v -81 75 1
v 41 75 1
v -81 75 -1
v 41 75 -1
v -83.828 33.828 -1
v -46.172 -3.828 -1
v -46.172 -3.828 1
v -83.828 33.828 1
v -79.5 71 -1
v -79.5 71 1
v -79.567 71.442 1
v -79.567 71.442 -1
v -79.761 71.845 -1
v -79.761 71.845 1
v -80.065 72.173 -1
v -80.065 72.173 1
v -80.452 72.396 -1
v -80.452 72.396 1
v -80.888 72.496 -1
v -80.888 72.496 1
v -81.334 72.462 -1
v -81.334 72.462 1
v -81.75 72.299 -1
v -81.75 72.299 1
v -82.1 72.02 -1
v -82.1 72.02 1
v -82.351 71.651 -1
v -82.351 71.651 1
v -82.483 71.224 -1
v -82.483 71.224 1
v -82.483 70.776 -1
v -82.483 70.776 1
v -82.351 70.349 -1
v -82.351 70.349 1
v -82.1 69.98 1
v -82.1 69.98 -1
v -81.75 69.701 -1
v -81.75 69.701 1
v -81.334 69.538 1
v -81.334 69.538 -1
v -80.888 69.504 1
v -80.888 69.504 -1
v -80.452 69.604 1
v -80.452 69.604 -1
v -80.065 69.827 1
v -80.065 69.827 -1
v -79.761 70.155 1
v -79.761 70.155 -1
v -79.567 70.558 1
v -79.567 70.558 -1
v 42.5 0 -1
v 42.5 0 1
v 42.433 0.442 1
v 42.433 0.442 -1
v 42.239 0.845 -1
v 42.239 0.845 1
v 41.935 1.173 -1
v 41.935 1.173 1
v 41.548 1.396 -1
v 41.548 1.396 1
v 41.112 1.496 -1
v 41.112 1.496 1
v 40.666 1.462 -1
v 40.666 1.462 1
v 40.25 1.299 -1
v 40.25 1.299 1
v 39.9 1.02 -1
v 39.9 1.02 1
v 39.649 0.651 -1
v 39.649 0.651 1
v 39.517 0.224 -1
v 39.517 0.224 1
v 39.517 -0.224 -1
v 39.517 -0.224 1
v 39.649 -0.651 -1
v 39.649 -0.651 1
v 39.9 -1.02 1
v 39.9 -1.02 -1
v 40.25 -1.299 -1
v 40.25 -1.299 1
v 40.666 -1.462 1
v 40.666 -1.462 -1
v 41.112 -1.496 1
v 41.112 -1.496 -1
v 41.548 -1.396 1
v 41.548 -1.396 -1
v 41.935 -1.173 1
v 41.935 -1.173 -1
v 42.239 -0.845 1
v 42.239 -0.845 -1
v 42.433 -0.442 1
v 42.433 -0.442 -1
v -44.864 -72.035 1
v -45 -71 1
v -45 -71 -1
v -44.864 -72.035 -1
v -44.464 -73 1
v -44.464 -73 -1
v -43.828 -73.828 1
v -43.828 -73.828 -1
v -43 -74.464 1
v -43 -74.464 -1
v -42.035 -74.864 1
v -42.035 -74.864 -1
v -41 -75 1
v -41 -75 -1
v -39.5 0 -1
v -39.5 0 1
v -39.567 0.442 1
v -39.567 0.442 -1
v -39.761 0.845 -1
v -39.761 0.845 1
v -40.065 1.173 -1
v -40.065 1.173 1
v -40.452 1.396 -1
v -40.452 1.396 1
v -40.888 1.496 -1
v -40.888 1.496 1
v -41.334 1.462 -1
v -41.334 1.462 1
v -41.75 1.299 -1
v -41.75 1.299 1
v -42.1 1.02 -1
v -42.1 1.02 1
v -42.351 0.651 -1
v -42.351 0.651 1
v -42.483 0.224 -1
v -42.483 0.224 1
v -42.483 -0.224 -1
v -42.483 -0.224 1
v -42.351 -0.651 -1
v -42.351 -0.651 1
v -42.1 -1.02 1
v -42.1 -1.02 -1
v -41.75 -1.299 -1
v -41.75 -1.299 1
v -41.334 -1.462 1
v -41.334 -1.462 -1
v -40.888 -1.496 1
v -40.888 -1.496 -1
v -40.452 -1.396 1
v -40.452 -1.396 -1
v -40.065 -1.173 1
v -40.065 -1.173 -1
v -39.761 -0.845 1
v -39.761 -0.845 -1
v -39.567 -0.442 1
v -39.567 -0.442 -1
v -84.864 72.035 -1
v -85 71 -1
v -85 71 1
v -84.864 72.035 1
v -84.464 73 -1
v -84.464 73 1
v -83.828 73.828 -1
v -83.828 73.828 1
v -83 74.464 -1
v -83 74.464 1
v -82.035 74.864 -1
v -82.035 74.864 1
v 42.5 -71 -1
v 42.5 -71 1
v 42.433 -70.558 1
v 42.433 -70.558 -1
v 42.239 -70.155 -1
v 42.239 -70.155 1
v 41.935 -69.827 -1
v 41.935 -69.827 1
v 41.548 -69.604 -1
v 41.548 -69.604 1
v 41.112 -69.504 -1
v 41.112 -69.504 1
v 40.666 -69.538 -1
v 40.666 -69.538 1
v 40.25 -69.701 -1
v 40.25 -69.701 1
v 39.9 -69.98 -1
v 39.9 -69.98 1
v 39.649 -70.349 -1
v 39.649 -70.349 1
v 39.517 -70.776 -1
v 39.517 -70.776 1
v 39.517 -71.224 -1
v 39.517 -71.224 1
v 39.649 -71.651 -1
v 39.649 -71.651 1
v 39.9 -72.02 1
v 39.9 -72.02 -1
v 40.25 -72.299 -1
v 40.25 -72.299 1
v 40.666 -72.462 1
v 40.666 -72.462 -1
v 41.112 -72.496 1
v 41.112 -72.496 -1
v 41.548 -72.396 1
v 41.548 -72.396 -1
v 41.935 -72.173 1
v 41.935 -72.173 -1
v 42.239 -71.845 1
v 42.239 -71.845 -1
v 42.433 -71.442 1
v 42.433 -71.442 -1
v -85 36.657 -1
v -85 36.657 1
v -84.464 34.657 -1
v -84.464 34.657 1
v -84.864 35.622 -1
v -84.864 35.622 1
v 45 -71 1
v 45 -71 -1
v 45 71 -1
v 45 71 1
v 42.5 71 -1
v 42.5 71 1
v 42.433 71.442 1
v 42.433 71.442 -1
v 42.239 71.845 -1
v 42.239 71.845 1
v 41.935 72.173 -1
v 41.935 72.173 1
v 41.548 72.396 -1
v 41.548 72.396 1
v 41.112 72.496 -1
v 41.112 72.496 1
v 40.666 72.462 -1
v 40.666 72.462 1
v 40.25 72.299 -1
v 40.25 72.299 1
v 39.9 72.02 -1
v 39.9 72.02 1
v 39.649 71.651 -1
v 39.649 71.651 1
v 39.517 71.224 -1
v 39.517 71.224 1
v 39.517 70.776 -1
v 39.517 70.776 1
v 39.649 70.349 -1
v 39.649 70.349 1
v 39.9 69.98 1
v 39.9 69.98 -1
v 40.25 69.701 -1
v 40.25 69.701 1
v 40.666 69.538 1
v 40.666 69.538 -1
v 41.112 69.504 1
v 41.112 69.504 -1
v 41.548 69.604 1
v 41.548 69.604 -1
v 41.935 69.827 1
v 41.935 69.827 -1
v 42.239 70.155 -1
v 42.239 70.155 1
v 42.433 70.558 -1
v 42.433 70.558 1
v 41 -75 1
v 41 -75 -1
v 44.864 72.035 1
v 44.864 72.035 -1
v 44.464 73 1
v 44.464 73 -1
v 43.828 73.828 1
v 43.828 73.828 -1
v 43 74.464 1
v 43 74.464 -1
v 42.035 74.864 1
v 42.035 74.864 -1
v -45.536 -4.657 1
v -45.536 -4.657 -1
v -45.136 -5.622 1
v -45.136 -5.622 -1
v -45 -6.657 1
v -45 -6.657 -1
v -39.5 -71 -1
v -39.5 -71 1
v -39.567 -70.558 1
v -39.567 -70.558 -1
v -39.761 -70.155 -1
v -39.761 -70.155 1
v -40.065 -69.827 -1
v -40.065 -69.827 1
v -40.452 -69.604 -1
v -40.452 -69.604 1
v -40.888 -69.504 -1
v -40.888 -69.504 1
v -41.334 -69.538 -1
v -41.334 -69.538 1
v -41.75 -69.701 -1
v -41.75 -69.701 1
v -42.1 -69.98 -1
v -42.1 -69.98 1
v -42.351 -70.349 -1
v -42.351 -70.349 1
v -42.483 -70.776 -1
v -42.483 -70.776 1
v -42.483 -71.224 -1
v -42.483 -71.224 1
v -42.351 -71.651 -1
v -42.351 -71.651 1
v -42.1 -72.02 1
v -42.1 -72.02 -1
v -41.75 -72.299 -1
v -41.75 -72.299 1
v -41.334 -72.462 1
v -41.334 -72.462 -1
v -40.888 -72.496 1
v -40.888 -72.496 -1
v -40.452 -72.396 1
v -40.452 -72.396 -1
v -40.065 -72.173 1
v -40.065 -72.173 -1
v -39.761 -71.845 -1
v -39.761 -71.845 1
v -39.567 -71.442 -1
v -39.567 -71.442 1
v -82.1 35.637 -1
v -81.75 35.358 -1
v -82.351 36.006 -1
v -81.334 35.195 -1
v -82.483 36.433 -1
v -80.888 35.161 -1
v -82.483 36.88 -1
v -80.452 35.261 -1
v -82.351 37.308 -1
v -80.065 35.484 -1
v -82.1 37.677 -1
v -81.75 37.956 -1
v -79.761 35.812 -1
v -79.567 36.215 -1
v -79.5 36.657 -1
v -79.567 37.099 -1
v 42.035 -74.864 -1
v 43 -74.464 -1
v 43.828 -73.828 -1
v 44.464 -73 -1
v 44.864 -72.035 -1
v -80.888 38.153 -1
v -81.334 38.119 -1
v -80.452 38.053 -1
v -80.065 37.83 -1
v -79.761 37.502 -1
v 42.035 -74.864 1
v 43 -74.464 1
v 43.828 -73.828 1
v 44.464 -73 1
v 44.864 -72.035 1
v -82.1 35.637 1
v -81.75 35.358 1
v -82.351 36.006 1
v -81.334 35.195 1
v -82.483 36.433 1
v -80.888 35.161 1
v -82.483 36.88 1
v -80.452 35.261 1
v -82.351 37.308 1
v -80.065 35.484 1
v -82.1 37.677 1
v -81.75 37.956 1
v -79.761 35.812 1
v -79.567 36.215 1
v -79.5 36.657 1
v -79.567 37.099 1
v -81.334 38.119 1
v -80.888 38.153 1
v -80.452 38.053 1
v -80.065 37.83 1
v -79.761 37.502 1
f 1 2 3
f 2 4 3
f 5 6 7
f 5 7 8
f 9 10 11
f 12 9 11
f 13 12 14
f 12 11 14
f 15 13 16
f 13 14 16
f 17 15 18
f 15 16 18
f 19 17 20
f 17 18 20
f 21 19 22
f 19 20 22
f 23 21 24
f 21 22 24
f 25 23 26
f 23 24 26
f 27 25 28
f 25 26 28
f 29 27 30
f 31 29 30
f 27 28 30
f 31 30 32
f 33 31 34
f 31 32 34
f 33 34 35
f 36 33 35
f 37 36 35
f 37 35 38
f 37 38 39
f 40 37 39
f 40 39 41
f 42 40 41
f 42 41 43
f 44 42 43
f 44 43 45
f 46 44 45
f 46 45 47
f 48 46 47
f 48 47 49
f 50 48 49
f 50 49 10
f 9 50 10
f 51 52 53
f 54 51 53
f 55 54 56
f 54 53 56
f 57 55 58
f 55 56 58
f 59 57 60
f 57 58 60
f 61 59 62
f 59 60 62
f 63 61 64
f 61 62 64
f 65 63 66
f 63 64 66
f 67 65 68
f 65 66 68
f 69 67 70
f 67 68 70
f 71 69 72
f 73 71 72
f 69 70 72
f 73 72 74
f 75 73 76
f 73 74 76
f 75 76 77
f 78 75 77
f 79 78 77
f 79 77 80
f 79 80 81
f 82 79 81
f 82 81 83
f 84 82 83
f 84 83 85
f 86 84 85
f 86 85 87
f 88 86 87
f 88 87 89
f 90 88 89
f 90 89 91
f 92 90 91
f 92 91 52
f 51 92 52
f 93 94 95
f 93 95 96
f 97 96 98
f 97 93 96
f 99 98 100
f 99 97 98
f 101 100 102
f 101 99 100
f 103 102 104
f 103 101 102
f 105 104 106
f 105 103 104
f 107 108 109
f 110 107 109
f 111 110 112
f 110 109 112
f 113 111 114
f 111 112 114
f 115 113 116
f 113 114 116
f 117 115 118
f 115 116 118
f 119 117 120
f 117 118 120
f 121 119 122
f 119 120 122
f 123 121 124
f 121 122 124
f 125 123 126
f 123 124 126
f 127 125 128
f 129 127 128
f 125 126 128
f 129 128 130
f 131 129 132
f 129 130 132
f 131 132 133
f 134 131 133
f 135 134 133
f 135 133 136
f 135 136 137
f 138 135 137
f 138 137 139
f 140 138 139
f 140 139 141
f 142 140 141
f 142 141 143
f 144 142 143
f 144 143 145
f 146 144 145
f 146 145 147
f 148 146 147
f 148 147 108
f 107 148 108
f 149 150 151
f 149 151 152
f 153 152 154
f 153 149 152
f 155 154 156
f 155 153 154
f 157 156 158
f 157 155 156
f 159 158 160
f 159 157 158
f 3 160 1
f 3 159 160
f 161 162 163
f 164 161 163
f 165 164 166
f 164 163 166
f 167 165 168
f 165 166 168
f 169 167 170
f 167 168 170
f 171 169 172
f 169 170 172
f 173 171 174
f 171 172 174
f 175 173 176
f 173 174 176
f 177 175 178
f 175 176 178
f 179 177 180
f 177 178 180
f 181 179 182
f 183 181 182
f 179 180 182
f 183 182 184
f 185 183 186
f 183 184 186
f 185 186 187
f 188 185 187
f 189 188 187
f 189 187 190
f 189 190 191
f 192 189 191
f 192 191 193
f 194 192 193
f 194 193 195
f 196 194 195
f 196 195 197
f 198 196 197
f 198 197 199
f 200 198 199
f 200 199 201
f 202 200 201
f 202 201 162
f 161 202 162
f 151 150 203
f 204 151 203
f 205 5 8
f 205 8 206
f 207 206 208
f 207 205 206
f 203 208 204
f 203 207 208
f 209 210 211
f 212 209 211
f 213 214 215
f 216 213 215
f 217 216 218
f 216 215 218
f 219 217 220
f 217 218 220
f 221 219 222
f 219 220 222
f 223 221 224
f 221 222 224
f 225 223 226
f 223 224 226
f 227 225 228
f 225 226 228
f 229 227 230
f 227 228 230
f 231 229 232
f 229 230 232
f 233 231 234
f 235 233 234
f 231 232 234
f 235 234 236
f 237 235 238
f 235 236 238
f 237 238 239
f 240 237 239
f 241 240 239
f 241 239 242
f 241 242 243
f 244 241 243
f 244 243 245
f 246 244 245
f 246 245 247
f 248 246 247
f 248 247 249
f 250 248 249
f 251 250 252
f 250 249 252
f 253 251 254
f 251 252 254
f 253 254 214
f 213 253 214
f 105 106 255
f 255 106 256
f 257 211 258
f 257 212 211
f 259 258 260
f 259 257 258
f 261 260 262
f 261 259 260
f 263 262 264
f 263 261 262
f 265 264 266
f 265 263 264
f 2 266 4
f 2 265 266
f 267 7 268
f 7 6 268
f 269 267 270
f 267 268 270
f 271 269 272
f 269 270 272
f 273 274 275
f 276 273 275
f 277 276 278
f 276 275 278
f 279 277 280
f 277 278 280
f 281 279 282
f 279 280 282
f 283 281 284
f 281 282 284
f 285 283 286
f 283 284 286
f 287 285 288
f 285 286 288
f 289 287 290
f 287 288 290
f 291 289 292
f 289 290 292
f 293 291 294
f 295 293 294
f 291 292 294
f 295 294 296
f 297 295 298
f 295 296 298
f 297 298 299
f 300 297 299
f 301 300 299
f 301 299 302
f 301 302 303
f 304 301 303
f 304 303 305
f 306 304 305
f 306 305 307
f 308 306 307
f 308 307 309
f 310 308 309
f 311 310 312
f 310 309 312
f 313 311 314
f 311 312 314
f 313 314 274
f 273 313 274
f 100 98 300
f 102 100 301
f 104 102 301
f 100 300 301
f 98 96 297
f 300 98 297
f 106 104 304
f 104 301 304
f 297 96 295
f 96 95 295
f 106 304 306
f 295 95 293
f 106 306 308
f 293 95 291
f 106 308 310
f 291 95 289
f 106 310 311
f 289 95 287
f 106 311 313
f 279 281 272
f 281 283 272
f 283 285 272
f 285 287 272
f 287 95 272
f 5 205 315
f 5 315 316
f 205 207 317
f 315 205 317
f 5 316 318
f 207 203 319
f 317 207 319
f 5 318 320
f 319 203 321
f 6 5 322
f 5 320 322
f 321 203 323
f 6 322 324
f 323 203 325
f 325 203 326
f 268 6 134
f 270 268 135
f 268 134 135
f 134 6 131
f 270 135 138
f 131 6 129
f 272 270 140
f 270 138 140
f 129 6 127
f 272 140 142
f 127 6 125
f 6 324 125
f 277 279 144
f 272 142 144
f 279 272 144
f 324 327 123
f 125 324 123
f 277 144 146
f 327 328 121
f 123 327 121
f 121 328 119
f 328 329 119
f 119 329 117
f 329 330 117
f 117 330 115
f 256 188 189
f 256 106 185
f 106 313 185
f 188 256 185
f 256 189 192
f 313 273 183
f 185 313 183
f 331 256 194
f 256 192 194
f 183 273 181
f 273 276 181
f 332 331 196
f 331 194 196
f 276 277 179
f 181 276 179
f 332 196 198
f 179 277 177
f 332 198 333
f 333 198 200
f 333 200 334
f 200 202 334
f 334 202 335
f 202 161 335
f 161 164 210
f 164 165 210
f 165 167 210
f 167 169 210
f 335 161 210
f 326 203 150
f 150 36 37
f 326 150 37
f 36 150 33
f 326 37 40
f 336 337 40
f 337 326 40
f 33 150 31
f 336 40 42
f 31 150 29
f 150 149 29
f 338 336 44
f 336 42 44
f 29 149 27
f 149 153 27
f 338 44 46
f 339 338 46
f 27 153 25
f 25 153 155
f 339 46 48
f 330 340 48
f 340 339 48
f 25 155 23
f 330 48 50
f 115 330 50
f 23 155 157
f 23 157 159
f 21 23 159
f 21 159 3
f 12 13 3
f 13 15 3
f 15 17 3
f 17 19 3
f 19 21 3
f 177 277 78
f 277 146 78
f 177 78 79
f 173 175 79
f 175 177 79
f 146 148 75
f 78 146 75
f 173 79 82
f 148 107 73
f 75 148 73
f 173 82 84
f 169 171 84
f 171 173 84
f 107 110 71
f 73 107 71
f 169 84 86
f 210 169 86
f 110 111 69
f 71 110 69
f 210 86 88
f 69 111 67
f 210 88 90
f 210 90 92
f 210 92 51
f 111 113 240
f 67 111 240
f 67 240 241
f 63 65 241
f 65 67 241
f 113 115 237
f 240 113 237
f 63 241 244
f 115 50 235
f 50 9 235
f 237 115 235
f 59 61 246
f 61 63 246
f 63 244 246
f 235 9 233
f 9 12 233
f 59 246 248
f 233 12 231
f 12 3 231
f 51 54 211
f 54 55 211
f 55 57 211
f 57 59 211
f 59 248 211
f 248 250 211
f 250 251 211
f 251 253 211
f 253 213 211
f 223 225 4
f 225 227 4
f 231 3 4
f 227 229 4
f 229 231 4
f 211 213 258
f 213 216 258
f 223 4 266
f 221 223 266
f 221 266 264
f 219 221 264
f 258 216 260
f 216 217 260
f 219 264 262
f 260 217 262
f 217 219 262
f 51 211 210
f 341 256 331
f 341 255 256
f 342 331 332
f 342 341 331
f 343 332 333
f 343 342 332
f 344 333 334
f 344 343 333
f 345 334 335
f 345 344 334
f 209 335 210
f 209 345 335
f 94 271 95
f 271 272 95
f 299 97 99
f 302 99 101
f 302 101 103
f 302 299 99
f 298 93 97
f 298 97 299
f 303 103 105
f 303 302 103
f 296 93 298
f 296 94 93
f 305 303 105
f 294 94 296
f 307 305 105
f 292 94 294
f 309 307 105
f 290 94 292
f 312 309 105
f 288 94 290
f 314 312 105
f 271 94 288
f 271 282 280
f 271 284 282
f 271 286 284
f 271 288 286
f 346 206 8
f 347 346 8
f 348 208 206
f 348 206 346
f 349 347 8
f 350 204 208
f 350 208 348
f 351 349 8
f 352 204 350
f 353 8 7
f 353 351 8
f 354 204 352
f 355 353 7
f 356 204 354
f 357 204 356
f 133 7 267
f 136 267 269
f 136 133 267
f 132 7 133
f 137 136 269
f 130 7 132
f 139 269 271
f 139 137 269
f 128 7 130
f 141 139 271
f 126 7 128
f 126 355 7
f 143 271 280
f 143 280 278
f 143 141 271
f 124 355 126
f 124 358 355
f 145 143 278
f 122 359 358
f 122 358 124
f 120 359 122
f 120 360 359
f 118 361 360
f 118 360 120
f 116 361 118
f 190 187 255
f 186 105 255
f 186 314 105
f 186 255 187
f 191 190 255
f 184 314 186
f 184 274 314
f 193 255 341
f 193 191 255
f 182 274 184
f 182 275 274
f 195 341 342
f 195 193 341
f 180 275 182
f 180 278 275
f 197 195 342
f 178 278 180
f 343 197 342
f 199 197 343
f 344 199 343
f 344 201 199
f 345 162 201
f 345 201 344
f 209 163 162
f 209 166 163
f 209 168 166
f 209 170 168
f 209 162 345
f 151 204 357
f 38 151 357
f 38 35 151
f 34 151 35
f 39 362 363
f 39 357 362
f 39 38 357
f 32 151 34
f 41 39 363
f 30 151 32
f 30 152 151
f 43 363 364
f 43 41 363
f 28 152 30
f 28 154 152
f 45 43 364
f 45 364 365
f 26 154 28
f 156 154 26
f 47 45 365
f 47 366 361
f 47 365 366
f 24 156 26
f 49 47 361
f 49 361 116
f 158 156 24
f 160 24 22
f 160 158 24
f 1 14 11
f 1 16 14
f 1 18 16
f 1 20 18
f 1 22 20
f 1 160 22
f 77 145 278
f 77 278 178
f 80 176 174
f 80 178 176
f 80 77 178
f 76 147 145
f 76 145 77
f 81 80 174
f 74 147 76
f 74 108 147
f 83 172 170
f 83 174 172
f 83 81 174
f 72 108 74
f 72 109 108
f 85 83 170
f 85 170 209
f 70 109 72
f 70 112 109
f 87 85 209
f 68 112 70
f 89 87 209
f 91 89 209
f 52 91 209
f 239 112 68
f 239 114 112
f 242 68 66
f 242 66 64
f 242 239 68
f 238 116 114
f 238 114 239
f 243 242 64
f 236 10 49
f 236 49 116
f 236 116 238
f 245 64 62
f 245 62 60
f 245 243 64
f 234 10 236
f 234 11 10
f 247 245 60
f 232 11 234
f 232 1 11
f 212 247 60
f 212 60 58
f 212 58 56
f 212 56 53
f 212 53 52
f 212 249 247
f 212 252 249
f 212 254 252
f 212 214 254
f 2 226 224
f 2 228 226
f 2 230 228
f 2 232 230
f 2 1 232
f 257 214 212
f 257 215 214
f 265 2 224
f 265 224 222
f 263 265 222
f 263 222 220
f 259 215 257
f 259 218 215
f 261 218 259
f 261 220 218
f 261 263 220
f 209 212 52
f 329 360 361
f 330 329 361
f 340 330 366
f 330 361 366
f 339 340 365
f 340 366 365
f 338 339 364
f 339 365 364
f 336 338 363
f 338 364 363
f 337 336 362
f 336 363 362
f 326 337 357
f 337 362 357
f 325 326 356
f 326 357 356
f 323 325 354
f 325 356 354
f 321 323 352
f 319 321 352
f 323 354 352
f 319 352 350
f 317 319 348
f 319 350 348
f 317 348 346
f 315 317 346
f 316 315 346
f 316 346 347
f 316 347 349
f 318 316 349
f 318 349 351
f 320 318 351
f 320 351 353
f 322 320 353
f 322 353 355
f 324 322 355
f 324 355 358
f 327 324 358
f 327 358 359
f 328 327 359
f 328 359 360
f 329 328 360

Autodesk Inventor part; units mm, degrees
sketch "Эскиз1" plane through (0, 0, 0) normal (0, 0, 1) x (1, 0, 0)
  line L0 (-45, -75) -> (45, -75)
  line L1 (45, -75) -> (45, 75)
  line L2 (45, 75) -> (-85, 75)
  line L3 (-45, 0) -> (-45, -75)
  line L4 (-45, -75) -> (45, 75) construction
  line L5 (45, -75) -> (-45, 75) construction
  line L6 (-85, 75) -> (-85, 0)
  line L7 (-85, 0) -> (-49.5, 0)
  line L8 (-45, 0) -> (-85, 0)
  line L9 (-45, -5) -> (-85, 35)
  point P0 (0, 0)
  dimension "d0" = 90
  dimension "d1" = 150
  dimension "d22" = 75
  dimension "d25" = 130
  dimension "d26" = 45
  dimension "d27" = 40
extrude "Выдавливание1" add sketch "Эскиз1" along normal mid plane 2 contours L3 L8 L7 L9 L6 L2 L1 L0 | L9 L7 L8 L3
fillet "Сопряжение2" radius 4 6 edges at (45, 75, 0) (45, -75, 0) (-45, -75, 0) (-45, -5, 0) (-85, 35, 0) (-85, 75, 0)
sketch "Эскиз4" plane through (0, 0, 1) normal (0, 0, 1) x (1, 0, 0)
  circle A0 centre (-81, 36.6569) radius 1.5
  circle A1 centre (-41, 0) radius 1.5
  circle A2 centre (41, 0) radius 1.5
  circle A3 centre (41, -71) radius 1.5
  circle A4 centre (-41, -71) radius 1.5
  circle A5 centre (41, 71) radius 1.5
  circle A6 centre (-81, 71) radius 1.5
  arc A7 (-81, 75) -> (-85, 71) centre (-81, 71) ccw construction
  line L0 (-85, 71) -> (-85, 36.6569) construction
  arc A8 (-85, 36.6569) -> (-83.8284, 33.8284) centre (-81, 36.6569) ccw construction
  line L1 (-83.8284, 33.8284) -> (-46.1716, -3.8284) construction
  arc A9 (-45, -6.6569) -> (-46.1716, -3.8284) centre (-49, -6.6569) ccw construction
  line L2 (-45, -6.6569) -> (-45, -71) construction
  arc A10 (-45, -71) -> (-41, -75) centre (-41, -71) ccw construction
  line L3 (-41, -75) -> (41, -75) construction
  arc A11 (41, -75) -> (45, -71) centre (41, -71) ccw construction
  line L4 (45, -71) -> (45, 71) construction
  arc A12 (45, 71) -> (41, 75) centre (41, 71) ccw construction
  line L5 (41, 75) -> (-81, 75) construction
  line L6 (-81, 71) -> (-81, 36.6569) construction
  line L7 (-81, 36.6569) -> (-43.3431, -1) construction
  arc A13 (-41, -6.6569) -> (-43.3431, -1) centre (-49, -6.6569) ccw construction
  line L8 (-41, -6.6569) -> (-41, -71) construction
  line L9 (-41, -71) -> (41, -71) construction
  line L10 (41, -71) -> (41, 71) construction
  line L11 (41, 71) -> (-81, 71) construction
  line L12 (-112.1598, 0) -> (72.1598, 0) projected
  point P0 (0, 0)
  point P1 (41, 0)
  dimension "d29" = 3
  dimension "d30" = 4
  dimension "d31" = 41
extrude "Выдавливание4" cut sketch "Эскиз4" against normal through all
properties part number "Контур платы"
